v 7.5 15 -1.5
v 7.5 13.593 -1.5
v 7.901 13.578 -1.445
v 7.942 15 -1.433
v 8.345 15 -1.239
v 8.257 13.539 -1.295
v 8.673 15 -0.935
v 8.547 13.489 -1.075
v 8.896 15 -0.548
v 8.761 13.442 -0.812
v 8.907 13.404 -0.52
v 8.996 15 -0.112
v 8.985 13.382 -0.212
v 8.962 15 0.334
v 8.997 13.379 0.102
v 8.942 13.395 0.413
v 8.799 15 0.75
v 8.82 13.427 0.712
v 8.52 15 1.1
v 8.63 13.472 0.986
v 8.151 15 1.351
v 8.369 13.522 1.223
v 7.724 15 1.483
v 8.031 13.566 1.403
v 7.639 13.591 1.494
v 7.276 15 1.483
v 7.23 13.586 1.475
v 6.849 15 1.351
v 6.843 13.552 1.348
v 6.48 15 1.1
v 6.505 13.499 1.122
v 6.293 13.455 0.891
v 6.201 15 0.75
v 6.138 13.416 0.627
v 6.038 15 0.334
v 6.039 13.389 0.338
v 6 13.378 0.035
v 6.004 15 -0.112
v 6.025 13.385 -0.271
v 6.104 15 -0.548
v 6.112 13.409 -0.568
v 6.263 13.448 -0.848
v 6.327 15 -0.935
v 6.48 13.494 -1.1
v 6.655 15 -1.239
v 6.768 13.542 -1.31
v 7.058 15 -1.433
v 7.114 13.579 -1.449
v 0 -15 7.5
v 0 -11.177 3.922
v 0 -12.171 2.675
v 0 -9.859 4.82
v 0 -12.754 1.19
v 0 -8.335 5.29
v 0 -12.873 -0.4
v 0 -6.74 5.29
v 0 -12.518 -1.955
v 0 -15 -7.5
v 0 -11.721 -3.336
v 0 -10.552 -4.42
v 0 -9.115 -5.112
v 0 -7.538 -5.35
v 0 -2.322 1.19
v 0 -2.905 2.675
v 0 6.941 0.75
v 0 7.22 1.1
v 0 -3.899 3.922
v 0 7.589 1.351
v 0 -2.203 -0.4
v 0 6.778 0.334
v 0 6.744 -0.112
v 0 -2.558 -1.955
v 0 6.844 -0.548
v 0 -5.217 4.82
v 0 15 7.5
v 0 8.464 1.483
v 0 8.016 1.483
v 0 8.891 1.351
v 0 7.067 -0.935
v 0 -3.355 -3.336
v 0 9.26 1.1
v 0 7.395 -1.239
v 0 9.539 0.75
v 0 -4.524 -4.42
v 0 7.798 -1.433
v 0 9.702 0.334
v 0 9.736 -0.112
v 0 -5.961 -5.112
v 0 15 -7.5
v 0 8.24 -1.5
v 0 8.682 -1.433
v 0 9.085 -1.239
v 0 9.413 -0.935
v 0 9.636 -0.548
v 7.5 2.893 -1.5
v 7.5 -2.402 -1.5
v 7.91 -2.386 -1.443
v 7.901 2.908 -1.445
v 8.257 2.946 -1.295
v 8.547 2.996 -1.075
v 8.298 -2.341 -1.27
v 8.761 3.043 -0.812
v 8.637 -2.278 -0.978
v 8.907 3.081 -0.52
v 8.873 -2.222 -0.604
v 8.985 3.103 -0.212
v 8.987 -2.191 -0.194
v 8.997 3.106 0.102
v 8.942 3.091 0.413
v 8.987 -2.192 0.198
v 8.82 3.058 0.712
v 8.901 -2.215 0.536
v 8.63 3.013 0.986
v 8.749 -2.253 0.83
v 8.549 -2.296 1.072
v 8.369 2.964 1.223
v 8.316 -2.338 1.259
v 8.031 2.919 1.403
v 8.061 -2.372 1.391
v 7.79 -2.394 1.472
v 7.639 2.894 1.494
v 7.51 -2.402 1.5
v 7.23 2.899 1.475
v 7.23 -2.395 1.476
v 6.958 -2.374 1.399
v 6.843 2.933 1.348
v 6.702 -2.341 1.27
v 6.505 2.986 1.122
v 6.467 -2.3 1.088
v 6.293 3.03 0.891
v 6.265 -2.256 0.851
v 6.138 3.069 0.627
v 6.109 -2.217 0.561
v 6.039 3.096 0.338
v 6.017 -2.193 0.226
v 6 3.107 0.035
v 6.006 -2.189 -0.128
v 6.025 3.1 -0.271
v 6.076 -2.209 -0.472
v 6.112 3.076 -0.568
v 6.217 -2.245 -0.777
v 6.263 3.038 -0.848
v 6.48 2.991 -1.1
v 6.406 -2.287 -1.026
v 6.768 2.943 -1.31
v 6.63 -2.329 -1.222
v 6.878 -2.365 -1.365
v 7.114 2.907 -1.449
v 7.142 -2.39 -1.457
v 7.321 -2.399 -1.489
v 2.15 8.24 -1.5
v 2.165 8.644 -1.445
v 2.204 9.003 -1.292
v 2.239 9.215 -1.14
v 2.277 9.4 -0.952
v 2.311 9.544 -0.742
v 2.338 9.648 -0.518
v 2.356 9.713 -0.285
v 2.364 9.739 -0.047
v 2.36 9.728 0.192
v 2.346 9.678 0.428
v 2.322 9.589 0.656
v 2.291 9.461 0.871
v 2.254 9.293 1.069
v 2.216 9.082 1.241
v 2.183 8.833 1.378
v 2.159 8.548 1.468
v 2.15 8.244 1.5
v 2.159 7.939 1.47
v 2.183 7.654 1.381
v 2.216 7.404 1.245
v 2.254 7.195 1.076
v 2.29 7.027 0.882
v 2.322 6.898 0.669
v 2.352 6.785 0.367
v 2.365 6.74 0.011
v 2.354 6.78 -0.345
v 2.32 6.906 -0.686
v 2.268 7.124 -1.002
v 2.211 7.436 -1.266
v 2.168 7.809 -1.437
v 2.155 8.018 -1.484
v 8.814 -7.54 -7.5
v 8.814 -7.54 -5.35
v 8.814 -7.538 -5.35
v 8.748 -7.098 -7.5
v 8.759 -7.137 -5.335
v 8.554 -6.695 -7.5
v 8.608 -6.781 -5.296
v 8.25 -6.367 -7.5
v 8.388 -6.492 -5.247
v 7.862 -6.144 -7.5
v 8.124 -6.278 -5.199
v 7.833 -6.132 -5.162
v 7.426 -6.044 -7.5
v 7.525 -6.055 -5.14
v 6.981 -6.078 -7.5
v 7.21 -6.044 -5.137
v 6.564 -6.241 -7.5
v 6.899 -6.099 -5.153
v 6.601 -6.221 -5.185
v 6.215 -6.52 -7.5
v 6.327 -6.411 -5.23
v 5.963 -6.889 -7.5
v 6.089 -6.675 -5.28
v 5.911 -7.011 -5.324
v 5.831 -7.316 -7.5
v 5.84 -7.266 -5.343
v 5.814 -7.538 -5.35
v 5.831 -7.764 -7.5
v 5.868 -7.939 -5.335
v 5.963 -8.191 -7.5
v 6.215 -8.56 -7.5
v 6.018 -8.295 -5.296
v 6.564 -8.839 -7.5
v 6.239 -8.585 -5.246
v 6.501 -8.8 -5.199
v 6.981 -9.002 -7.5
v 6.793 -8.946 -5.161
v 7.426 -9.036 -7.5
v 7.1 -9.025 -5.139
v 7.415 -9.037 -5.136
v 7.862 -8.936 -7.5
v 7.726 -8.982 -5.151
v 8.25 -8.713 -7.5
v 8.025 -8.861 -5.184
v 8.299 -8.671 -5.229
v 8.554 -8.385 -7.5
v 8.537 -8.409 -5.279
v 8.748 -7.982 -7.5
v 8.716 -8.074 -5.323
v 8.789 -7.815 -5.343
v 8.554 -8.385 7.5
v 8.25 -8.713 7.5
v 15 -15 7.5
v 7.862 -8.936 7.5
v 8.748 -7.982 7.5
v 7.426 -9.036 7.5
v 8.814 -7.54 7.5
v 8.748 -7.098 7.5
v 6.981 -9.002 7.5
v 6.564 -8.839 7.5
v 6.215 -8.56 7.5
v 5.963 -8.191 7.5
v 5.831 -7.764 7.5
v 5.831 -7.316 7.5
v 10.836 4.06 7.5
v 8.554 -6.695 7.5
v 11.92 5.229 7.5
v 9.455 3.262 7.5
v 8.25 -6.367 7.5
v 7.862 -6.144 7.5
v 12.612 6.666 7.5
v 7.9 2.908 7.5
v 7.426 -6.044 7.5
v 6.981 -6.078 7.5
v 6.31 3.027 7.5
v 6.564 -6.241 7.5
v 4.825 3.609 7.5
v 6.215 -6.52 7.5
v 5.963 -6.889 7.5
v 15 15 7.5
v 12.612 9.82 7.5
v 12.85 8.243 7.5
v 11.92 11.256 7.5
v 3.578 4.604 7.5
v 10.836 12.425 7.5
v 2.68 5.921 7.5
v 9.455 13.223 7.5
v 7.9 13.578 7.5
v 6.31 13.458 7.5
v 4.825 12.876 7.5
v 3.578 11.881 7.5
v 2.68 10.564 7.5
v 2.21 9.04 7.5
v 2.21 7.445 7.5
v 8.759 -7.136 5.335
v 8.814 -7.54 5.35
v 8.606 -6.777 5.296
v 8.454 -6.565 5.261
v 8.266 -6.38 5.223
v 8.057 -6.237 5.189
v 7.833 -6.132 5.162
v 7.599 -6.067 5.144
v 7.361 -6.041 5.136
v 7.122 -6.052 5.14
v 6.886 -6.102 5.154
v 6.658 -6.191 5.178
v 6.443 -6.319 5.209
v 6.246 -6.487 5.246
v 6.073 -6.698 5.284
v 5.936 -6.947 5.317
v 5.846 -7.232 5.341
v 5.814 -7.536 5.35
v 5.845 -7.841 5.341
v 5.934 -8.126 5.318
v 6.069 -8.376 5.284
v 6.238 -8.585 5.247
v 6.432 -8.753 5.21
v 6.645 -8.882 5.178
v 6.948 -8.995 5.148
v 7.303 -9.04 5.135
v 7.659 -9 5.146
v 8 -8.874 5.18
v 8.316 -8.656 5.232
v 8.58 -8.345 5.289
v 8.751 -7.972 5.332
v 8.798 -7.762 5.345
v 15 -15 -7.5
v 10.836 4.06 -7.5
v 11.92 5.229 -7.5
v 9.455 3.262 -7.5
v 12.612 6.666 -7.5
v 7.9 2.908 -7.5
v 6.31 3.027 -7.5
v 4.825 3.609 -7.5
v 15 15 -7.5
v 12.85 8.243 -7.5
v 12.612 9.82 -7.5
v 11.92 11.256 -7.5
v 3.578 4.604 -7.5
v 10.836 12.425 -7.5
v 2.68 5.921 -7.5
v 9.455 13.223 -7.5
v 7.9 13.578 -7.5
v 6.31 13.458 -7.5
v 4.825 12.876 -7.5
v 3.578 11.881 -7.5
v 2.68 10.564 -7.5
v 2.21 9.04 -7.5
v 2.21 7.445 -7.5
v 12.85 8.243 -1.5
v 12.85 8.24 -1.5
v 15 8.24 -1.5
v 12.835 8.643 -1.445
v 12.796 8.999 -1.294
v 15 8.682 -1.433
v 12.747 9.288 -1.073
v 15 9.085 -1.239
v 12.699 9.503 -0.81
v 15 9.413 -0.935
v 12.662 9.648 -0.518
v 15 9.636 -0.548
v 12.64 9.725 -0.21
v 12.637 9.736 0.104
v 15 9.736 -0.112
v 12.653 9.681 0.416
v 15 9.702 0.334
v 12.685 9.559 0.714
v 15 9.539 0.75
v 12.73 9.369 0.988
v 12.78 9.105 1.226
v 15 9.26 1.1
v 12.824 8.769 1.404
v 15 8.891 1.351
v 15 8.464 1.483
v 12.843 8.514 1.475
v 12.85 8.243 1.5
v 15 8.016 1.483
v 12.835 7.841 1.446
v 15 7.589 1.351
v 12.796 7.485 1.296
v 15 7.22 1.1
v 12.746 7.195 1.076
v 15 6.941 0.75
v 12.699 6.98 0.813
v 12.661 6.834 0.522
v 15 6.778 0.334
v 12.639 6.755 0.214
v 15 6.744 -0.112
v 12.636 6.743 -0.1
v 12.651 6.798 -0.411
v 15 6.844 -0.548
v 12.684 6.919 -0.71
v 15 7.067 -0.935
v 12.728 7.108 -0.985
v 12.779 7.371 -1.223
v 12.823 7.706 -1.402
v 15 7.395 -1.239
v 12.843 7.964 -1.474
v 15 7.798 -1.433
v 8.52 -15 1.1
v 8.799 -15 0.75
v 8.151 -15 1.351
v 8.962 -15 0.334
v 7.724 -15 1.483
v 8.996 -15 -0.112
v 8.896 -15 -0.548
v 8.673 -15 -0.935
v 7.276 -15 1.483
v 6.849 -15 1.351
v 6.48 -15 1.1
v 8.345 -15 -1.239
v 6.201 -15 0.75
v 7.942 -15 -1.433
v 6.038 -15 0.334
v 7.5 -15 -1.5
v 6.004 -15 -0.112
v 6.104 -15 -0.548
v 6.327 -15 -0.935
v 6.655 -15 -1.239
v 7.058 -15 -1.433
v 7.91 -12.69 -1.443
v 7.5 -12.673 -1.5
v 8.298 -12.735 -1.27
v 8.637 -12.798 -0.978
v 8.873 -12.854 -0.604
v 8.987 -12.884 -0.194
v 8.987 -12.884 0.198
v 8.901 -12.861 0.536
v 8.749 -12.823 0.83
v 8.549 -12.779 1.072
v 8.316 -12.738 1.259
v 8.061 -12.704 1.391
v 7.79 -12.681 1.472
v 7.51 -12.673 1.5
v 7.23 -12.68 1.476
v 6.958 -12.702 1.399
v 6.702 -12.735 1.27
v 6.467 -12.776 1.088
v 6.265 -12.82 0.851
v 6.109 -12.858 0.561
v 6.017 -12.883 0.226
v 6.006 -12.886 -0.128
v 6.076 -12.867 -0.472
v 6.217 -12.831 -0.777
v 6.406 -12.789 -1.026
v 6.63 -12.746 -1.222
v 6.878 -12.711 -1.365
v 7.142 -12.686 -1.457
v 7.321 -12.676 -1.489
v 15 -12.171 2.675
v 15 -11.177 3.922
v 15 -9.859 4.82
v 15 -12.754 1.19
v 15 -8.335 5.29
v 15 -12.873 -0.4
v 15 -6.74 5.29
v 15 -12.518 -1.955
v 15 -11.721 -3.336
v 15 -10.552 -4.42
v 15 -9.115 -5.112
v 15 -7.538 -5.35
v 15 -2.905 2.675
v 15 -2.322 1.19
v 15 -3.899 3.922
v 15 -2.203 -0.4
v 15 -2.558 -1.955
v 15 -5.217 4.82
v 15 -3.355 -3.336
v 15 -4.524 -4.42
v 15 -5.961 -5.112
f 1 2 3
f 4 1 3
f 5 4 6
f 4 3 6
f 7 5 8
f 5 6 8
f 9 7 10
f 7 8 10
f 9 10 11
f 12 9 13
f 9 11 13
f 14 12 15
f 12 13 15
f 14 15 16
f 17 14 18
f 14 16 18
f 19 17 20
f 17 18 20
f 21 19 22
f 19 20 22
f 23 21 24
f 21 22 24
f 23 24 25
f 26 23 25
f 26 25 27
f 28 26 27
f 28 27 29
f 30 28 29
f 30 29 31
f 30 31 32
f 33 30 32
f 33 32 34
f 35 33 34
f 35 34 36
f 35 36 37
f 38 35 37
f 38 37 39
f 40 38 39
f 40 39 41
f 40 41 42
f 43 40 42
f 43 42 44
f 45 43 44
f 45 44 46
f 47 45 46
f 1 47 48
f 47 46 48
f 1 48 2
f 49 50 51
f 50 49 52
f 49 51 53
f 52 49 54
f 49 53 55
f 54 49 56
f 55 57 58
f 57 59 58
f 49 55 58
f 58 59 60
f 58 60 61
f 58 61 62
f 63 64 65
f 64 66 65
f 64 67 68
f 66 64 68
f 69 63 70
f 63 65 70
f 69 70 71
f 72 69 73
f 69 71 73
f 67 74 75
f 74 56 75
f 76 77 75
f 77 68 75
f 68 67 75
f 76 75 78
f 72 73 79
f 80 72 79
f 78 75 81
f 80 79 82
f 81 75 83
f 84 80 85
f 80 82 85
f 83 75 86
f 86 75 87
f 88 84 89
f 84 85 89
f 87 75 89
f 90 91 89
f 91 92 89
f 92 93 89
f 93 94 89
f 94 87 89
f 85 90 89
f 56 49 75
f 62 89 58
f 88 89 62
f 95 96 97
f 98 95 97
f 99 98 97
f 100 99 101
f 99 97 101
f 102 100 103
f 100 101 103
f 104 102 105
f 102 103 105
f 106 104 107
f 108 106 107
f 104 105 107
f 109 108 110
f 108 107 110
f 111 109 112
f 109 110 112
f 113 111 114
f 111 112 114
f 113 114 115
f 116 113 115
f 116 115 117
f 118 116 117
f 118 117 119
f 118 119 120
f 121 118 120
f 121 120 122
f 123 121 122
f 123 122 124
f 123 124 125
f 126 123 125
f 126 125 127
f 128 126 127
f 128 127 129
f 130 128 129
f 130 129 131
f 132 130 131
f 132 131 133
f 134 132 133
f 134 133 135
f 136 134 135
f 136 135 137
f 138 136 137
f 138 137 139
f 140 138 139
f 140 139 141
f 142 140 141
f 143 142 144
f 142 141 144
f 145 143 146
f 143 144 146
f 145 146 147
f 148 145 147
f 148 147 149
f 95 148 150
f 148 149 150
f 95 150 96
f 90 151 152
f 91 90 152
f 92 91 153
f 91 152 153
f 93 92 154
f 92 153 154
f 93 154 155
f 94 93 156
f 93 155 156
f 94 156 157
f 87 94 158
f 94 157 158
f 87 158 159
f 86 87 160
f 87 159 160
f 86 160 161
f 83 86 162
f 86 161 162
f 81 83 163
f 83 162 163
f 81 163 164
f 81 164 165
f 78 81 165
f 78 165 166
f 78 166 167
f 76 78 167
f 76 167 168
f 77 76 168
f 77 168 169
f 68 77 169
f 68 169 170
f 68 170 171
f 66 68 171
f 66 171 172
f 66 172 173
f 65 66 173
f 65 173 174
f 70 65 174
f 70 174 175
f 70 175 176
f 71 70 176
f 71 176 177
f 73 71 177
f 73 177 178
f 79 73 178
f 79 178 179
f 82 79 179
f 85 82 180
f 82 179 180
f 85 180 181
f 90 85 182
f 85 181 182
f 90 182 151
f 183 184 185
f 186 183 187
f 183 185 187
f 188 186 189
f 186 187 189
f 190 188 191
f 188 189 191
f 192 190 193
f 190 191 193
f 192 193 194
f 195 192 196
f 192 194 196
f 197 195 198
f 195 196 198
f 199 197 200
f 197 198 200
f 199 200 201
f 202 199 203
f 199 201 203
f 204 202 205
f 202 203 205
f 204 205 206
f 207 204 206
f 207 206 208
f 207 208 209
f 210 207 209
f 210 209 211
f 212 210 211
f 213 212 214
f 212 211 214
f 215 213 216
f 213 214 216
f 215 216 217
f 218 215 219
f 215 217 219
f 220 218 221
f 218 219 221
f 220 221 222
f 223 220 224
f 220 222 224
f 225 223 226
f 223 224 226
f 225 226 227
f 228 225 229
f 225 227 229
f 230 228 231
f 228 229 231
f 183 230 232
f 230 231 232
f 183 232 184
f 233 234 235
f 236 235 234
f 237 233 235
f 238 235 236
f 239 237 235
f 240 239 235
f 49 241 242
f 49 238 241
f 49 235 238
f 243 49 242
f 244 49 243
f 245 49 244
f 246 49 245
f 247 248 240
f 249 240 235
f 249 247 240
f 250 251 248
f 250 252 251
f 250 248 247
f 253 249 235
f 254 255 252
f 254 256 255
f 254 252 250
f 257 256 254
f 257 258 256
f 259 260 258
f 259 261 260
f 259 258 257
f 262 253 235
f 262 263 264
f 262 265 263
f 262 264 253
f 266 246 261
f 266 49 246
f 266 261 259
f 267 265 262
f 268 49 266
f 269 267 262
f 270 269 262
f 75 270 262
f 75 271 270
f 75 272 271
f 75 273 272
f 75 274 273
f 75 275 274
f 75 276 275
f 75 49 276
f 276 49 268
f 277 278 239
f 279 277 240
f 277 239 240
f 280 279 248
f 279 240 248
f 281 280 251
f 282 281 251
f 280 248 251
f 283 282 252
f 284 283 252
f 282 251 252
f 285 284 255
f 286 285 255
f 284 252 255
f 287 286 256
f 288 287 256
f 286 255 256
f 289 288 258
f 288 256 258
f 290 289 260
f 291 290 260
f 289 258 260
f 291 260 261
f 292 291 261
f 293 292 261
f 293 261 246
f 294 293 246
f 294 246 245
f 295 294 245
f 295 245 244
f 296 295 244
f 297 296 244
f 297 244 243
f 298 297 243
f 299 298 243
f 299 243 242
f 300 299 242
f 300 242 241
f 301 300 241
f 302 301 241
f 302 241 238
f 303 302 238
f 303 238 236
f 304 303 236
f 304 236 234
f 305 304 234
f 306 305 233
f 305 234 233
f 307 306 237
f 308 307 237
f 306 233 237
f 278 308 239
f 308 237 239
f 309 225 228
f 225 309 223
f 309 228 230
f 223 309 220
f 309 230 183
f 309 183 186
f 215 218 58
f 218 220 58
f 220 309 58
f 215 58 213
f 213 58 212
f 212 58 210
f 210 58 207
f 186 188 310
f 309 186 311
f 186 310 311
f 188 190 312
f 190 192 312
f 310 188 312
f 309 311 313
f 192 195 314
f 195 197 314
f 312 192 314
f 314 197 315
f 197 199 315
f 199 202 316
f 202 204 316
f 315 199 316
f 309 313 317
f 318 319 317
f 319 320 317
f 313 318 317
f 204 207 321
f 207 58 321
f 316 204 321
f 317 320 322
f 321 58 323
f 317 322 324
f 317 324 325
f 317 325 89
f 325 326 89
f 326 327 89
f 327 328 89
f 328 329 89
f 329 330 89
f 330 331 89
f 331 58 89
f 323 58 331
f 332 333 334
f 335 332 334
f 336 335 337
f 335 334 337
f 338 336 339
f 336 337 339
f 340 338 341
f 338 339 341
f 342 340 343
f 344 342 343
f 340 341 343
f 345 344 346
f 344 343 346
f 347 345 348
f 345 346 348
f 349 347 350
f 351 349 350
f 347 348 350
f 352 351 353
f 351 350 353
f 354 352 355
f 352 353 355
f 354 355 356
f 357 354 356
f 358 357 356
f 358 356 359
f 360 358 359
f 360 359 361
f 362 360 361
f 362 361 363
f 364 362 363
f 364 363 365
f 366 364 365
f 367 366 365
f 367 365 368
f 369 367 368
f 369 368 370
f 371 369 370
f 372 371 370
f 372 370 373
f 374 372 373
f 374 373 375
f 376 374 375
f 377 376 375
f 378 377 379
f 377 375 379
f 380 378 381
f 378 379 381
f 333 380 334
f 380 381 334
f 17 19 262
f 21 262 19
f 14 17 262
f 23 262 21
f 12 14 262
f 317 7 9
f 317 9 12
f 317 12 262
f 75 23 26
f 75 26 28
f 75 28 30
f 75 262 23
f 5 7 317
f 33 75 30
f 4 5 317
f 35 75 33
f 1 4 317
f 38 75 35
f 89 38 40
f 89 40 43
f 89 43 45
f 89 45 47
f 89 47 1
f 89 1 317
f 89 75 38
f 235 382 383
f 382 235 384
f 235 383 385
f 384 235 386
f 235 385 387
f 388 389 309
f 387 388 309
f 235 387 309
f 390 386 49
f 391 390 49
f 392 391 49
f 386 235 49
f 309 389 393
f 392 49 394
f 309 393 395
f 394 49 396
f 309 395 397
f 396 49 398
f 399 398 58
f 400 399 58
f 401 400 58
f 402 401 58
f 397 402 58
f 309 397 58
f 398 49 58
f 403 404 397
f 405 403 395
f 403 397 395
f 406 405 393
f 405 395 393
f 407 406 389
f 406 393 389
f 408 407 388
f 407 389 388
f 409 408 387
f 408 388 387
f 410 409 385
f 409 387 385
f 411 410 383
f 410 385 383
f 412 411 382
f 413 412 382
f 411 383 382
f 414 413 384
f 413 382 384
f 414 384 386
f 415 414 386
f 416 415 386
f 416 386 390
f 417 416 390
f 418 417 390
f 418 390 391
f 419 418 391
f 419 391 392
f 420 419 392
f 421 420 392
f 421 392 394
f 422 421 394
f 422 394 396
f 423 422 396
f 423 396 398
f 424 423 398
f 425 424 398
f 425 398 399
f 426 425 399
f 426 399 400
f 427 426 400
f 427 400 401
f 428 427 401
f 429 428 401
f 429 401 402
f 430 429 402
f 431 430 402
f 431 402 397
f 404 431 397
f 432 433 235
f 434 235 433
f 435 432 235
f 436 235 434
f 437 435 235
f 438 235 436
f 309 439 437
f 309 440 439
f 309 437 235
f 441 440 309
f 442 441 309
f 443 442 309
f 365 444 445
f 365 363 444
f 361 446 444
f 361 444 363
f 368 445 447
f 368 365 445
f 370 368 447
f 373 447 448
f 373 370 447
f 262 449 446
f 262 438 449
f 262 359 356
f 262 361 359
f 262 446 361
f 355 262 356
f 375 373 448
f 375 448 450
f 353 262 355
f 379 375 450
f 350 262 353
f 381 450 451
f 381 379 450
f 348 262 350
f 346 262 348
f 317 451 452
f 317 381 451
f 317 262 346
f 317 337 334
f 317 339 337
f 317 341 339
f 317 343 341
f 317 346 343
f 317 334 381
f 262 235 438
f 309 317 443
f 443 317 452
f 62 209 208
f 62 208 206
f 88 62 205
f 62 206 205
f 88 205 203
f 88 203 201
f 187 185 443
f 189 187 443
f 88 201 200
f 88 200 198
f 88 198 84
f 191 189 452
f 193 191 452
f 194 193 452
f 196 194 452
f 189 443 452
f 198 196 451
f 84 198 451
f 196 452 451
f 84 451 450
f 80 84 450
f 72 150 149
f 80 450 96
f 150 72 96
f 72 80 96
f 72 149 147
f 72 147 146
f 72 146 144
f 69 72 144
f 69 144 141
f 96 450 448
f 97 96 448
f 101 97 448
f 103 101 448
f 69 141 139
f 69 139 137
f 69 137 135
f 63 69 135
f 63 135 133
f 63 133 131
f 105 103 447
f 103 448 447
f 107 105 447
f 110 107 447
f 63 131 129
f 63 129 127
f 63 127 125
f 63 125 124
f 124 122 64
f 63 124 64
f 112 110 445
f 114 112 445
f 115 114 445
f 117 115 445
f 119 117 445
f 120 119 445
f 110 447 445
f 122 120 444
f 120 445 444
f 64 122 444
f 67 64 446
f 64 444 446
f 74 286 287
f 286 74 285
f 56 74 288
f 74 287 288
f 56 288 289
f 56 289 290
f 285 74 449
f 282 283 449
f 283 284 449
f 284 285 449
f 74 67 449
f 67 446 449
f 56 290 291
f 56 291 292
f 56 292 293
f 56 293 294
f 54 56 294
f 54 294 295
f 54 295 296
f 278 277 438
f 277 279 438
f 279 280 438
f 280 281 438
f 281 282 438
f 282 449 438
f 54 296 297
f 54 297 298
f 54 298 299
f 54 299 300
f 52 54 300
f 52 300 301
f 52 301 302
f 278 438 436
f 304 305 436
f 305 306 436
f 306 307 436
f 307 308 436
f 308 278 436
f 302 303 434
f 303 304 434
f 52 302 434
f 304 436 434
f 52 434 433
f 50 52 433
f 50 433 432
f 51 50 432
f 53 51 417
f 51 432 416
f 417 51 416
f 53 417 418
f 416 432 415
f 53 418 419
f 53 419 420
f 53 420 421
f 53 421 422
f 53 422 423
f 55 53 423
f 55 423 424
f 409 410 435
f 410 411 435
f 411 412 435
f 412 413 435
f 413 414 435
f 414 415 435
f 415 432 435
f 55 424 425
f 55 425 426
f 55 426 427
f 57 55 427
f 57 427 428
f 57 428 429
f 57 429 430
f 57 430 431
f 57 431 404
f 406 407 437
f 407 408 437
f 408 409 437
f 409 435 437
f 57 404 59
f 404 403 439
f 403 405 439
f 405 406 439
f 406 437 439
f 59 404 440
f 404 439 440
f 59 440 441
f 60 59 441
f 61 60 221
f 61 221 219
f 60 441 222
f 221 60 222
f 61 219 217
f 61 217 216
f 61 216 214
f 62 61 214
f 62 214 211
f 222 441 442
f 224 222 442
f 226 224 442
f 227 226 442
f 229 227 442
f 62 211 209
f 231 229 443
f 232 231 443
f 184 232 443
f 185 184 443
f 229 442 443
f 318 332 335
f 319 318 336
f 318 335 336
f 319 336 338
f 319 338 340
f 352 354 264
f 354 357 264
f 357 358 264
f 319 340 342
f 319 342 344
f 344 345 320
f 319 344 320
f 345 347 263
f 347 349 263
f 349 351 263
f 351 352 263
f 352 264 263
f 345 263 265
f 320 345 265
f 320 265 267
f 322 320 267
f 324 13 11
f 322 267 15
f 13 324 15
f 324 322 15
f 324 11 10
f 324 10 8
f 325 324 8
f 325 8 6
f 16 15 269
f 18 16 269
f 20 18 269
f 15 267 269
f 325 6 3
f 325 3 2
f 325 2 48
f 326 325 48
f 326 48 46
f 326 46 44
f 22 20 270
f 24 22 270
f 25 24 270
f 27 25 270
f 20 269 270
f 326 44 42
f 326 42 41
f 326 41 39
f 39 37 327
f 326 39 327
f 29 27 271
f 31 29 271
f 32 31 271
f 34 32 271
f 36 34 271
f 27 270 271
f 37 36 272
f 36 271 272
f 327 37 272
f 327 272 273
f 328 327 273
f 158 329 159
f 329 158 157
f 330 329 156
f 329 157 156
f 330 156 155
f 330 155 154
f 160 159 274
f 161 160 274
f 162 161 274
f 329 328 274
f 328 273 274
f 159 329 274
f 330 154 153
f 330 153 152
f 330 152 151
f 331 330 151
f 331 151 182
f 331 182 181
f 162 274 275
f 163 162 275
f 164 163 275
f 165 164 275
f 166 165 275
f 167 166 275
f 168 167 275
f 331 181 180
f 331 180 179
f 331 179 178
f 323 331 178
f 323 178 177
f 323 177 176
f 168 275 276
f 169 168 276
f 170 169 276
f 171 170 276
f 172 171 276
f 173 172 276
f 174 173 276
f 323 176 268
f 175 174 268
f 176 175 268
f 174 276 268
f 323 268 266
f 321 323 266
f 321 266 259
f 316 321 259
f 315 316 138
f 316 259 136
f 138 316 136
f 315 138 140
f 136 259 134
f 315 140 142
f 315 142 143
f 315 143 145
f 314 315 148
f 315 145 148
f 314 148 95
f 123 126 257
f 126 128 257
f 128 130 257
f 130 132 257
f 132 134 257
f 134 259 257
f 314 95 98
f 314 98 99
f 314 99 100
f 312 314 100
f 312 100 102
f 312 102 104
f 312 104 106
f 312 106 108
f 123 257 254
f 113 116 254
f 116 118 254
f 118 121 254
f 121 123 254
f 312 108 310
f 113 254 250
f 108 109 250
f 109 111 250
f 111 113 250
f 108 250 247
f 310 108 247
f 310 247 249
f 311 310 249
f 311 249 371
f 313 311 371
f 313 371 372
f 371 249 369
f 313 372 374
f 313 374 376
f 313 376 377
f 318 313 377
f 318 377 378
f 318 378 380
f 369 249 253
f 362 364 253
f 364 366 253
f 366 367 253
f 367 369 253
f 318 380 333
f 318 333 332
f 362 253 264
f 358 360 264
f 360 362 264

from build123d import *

# Parameters (mm, degrees)
SKETCH_1_W          = 15
SKETCH_1_H          = 30
EXTRUDE_1_DEPTH     = 15
SKETCH_2_R          = 5.35
CUT_EXTRUDE_1_DEPTH = 15
SKETCH_4_R          = 5.35
CUT_EXTRUDE_2_DEPTH = 15
SKETCH_5_R          = 1.5
CUT_EXTRUDE_3_DEPTH = 20
SKETCH_7_R          = 1.5
CUT_EXTRUDE_4_DEPTH = 20
SKETCH_8_R          = 1.5
CUT_EXTRUDE_5_DEPTH = 50


with BuildPart() as part:
    # 草图1 → 凸台-拉伸1 (new body)
    with BuildSketch(Plane(origin=(0, 0, 0), x_dir=(0, 0, -1), z_dir=(1, 0, 0))):
        Rectangle(SKETCH_1_W, SKETCH_1_H)
    extrude(amount=EXTRUDE_1_DEPTH)

    # 草图2 → 切除-拉伸1 (cut)
    with BuildSketch(Plane(origin=(15, 0, 0), x_dir=(0, 0, -1), z_dir=(1, 0, 0))):
        with Locations((0, -7.537865607)):
            Circle(SKETCH_2_R)
    extrude(amount=-CUT_EXTRUDE_1_DEPTH, mode=Mode.SUBTRACT)

    # 草图4 → 切除-拉伸2 (cut)
    with BuildSketch(Plane.XY.offset(7.5)):
        with Locations((7.5, 8.242569868)):
            Circle(SKETCH_4_R)
    extrude(amount=-CUT_EXTRUDE_2_DEPTH, mode=Mode.SUBTRACT)

    # 草图5 → 切除-拉伸3 (cut)
    with BuildSketch(Plane.XY.offset(7.5)):
        with Locations((7.314343795, -7.54)):
            Circle(SKETCH_5_R)
    extrude(amount=-CUT_EXTRUDE_3_DEPTH, mode=Mode.SUBTRACT)

    # 草图7 → 切除-拉伸4 (cut)
    with BuildSketch(Plane(origin=(15, 0, 0), x_dir=(0, 0, -1), z_dir=(1, 0, 0))):
        with Locations((0, 8.24)):
            Circle(SKETCH_7_R)
    extrude(amount=-CUT_EXTRUDE_4_DEPTH, mode=Mode.SUBTRACT)

    # 草图8 → 切除-拉伸5 (cut)
    with BuildSketch(Plane.XZ.offset(15)):
        with Locations(Location((7.5, 0, 0), (0, 0, 270))):
            Circle(SKETCH_8_R)
    extrude(amount=-CUT_EXTRUDE_5_DEPTH, mode=Mode.SUBTRACT)


solid = part.part
